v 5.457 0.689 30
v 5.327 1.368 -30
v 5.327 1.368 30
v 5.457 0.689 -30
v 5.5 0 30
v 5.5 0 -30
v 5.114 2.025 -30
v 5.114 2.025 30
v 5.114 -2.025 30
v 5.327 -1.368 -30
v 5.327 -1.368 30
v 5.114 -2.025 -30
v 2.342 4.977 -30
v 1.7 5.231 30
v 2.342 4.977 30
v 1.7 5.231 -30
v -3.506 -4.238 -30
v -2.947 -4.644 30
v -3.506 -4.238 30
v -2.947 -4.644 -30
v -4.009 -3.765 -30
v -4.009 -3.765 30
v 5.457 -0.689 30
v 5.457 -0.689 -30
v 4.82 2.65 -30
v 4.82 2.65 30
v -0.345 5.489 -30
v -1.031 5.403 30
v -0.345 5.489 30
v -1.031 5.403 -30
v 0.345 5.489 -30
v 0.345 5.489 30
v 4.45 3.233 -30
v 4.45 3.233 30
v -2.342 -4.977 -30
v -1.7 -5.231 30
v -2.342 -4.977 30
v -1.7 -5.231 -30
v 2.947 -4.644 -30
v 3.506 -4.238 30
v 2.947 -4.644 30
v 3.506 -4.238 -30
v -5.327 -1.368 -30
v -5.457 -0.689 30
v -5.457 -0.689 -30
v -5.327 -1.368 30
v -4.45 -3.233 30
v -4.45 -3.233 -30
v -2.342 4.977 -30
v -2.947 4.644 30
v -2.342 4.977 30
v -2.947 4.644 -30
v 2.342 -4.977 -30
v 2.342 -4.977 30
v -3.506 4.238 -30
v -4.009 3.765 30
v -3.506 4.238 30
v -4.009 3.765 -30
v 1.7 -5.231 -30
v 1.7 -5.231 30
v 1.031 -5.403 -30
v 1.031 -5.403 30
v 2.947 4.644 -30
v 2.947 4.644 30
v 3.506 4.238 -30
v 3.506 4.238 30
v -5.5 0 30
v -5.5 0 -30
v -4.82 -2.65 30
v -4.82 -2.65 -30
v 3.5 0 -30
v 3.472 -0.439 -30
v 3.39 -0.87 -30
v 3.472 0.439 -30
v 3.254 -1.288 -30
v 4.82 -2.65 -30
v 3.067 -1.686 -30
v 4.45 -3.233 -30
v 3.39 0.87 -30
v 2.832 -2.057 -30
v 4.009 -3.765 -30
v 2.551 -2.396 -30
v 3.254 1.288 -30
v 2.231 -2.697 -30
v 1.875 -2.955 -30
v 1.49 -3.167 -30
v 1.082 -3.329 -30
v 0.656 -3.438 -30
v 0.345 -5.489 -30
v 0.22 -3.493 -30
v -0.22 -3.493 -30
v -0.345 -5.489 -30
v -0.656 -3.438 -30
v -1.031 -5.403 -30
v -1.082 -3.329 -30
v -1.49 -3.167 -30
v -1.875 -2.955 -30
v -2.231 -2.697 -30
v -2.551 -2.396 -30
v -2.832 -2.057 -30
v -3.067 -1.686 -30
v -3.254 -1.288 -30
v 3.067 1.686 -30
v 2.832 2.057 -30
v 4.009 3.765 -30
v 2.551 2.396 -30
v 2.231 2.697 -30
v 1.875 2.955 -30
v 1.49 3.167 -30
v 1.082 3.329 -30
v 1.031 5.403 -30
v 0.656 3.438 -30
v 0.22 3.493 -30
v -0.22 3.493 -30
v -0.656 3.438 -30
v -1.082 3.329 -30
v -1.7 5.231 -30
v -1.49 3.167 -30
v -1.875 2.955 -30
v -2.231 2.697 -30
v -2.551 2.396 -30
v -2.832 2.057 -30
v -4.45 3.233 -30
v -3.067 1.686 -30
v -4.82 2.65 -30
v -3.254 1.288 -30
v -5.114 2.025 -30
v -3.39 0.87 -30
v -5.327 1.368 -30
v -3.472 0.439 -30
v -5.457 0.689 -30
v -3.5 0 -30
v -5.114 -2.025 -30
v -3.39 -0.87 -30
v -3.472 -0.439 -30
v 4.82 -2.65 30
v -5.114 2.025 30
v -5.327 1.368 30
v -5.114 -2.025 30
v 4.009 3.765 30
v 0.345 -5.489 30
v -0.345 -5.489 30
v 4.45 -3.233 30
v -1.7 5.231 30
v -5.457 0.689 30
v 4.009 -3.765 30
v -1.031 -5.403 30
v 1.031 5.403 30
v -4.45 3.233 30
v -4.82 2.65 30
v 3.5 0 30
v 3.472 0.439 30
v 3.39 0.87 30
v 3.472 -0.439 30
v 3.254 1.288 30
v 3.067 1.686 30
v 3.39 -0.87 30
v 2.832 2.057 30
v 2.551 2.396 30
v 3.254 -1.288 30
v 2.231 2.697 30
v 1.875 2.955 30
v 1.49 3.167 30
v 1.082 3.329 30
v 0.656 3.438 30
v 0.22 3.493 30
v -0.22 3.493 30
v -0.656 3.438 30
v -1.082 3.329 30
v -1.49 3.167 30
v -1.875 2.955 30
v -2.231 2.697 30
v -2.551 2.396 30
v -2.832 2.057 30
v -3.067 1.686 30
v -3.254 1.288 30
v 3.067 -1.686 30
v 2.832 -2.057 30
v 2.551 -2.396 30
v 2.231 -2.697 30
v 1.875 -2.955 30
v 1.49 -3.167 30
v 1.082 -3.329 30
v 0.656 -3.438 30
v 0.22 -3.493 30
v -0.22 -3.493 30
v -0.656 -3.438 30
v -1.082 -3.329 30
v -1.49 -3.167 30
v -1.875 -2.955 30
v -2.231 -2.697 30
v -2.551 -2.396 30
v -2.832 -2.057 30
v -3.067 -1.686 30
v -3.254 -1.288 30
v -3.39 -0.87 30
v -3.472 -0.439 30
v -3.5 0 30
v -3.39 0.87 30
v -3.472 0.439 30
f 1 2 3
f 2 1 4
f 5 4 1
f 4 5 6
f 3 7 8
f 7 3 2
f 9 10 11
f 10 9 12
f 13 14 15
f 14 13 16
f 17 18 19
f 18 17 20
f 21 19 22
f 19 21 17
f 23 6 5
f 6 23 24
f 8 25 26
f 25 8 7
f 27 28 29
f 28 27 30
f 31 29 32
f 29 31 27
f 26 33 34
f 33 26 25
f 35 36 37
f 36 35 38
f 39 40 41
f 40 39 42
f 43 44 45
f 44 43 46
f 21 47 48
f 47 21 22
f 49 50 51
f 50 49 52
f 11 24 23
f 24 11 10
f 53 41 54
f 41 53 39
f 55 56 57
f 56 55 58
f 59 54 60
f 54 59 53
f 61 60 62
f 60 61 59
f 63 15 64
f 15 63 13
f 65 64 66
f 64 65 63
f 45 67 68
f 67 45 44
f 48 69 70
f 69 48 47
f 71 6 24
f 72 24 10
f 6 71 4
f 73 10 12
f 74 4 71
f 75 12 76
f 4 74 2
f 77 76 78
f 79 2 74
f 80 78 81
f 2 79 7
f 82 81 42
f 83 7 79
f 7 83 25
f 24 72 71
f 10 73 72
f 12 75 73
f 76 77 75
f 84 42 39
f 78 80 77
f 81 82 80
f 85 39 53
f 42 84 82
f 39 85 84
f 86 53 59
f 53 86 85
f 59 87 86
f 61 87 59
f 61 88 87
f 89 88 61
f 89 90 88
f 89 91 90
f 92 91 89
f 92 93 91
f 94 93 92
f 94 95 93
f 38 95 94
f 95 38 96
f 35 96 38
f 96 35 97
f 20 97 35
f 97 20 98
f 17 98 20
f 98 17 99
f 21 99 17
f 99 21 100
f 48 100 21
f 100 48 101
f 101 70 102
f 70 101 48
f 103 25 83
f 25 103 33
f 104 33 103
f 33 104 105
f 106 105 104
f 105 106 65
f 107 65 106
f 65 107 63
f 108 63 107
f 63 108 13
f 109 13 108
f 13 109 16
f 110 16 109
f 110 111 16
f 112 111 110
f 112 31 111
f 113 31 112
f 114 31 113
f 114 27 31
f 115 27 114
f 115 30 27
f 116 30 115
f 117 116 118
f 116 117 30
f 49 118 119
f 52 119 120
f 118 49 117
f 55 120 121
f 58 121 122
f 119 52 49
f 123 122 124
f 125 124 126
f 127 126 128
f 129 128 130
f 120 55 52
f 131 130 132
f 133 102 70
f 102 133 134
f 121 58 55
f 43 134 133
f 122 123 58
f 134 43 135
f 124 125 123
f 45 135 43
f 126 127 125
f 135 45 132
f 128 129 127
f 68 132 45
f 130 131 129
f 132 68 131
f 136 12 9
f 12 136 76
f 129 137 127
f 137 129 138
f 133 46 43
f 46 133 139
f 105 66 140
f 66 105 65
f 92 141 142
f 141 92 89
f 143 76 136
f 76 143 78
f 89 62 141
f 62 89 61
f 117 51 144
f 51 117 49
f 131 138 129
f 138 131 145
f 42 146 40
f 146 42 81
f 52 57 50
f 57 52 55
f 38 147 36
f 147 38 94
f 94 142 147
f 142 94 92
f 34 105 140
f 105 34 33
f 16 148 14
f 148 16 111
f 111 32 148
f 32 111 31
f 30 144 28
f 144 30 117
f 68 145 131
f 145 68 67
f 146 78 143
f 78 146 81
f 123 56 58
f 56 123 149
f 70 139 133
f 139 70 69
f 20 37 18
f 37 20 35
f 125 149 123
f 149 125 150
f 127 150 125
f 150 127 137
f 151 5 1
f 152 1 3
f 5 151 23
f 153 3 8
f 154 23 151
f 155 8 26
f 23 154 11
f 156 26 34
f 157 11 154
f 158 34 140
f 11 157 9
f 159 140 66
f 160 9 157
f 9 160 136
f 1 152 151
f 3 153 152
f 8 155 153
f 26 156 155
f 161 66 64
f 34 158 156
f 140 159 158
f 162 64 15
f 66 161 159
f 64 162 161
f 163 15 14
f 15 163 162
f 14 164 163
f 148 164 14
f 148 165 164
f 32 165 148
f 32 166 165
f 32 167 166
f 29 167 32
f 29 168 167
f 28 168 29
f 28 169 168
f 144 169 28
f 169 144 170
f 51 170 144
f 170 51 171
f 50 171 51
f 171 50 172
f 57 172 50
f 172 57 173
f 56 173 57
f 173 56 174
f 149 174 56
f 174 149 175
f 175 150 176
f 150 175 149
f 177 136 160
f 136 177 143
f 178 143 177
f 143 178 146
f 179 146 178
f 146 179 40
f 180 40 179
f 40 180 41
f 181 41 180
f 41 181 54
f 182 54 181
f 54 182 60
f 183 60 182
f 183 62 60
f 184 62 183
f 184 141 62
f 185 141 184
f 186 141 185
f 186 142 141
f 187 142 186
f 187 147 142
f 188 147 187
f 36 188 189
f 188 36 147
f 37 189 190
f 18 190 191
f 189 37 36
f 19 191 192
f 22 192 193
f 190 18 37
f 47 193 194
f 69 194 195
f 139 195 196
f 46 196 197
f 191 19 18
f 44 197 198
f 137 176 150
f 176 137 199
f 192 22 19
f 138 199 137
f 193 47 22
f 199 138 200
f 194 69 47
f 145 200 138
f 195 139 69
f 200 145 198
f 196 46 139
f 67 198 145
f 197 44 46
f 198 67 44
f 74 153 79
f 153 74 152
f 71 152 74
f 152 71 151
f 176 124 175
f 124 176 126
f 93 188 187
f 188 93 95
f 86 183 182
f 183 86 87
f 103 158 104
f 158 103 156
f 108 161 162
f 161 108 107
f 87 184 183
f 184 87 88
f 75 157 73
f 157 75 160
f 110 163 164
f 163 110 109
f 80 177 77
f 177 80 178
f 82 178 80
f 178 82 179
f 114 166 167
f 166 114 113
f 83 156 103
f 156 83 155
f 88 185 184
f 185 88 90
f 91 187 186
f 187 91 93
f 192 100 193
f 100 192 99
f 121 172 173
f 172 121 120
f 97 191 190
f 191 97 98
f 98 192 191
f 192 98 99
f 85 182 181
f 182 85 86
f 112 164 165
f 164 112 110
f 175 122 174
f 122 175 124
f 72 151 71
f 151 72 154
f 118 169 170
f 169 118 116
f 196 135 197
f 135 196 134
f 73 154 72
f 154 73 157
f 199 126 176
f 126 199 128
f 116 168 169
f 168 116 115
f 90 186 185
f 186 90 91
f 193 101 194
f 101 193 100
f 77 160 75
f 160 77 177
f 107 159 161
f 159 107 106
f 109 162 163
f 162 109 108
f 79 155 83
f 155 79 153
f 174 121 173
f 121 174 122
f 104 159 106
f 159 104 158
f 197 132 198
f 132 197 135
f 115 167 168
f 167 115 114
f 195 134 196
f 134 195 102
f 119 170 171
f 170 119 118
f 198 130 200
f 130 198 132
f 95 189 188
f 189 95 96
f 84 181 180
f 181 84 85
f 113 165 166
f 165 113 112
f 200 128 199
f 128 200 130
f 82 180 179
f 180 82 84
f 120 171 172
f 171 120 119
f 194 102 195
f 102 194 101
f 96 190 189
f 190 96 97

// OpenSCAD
$fn = 50;


difference() {
	union() {
		translate(v = [0, 0, -30.0000000000]) {
			cylinder(h = 60, r = 5.5000000000);
		}
	}
	union() {
		translate(v = [0, 0, -100.0000000000]) {
			cylinder(h = 200, r = 3.5000000000);
		}
	}
}
